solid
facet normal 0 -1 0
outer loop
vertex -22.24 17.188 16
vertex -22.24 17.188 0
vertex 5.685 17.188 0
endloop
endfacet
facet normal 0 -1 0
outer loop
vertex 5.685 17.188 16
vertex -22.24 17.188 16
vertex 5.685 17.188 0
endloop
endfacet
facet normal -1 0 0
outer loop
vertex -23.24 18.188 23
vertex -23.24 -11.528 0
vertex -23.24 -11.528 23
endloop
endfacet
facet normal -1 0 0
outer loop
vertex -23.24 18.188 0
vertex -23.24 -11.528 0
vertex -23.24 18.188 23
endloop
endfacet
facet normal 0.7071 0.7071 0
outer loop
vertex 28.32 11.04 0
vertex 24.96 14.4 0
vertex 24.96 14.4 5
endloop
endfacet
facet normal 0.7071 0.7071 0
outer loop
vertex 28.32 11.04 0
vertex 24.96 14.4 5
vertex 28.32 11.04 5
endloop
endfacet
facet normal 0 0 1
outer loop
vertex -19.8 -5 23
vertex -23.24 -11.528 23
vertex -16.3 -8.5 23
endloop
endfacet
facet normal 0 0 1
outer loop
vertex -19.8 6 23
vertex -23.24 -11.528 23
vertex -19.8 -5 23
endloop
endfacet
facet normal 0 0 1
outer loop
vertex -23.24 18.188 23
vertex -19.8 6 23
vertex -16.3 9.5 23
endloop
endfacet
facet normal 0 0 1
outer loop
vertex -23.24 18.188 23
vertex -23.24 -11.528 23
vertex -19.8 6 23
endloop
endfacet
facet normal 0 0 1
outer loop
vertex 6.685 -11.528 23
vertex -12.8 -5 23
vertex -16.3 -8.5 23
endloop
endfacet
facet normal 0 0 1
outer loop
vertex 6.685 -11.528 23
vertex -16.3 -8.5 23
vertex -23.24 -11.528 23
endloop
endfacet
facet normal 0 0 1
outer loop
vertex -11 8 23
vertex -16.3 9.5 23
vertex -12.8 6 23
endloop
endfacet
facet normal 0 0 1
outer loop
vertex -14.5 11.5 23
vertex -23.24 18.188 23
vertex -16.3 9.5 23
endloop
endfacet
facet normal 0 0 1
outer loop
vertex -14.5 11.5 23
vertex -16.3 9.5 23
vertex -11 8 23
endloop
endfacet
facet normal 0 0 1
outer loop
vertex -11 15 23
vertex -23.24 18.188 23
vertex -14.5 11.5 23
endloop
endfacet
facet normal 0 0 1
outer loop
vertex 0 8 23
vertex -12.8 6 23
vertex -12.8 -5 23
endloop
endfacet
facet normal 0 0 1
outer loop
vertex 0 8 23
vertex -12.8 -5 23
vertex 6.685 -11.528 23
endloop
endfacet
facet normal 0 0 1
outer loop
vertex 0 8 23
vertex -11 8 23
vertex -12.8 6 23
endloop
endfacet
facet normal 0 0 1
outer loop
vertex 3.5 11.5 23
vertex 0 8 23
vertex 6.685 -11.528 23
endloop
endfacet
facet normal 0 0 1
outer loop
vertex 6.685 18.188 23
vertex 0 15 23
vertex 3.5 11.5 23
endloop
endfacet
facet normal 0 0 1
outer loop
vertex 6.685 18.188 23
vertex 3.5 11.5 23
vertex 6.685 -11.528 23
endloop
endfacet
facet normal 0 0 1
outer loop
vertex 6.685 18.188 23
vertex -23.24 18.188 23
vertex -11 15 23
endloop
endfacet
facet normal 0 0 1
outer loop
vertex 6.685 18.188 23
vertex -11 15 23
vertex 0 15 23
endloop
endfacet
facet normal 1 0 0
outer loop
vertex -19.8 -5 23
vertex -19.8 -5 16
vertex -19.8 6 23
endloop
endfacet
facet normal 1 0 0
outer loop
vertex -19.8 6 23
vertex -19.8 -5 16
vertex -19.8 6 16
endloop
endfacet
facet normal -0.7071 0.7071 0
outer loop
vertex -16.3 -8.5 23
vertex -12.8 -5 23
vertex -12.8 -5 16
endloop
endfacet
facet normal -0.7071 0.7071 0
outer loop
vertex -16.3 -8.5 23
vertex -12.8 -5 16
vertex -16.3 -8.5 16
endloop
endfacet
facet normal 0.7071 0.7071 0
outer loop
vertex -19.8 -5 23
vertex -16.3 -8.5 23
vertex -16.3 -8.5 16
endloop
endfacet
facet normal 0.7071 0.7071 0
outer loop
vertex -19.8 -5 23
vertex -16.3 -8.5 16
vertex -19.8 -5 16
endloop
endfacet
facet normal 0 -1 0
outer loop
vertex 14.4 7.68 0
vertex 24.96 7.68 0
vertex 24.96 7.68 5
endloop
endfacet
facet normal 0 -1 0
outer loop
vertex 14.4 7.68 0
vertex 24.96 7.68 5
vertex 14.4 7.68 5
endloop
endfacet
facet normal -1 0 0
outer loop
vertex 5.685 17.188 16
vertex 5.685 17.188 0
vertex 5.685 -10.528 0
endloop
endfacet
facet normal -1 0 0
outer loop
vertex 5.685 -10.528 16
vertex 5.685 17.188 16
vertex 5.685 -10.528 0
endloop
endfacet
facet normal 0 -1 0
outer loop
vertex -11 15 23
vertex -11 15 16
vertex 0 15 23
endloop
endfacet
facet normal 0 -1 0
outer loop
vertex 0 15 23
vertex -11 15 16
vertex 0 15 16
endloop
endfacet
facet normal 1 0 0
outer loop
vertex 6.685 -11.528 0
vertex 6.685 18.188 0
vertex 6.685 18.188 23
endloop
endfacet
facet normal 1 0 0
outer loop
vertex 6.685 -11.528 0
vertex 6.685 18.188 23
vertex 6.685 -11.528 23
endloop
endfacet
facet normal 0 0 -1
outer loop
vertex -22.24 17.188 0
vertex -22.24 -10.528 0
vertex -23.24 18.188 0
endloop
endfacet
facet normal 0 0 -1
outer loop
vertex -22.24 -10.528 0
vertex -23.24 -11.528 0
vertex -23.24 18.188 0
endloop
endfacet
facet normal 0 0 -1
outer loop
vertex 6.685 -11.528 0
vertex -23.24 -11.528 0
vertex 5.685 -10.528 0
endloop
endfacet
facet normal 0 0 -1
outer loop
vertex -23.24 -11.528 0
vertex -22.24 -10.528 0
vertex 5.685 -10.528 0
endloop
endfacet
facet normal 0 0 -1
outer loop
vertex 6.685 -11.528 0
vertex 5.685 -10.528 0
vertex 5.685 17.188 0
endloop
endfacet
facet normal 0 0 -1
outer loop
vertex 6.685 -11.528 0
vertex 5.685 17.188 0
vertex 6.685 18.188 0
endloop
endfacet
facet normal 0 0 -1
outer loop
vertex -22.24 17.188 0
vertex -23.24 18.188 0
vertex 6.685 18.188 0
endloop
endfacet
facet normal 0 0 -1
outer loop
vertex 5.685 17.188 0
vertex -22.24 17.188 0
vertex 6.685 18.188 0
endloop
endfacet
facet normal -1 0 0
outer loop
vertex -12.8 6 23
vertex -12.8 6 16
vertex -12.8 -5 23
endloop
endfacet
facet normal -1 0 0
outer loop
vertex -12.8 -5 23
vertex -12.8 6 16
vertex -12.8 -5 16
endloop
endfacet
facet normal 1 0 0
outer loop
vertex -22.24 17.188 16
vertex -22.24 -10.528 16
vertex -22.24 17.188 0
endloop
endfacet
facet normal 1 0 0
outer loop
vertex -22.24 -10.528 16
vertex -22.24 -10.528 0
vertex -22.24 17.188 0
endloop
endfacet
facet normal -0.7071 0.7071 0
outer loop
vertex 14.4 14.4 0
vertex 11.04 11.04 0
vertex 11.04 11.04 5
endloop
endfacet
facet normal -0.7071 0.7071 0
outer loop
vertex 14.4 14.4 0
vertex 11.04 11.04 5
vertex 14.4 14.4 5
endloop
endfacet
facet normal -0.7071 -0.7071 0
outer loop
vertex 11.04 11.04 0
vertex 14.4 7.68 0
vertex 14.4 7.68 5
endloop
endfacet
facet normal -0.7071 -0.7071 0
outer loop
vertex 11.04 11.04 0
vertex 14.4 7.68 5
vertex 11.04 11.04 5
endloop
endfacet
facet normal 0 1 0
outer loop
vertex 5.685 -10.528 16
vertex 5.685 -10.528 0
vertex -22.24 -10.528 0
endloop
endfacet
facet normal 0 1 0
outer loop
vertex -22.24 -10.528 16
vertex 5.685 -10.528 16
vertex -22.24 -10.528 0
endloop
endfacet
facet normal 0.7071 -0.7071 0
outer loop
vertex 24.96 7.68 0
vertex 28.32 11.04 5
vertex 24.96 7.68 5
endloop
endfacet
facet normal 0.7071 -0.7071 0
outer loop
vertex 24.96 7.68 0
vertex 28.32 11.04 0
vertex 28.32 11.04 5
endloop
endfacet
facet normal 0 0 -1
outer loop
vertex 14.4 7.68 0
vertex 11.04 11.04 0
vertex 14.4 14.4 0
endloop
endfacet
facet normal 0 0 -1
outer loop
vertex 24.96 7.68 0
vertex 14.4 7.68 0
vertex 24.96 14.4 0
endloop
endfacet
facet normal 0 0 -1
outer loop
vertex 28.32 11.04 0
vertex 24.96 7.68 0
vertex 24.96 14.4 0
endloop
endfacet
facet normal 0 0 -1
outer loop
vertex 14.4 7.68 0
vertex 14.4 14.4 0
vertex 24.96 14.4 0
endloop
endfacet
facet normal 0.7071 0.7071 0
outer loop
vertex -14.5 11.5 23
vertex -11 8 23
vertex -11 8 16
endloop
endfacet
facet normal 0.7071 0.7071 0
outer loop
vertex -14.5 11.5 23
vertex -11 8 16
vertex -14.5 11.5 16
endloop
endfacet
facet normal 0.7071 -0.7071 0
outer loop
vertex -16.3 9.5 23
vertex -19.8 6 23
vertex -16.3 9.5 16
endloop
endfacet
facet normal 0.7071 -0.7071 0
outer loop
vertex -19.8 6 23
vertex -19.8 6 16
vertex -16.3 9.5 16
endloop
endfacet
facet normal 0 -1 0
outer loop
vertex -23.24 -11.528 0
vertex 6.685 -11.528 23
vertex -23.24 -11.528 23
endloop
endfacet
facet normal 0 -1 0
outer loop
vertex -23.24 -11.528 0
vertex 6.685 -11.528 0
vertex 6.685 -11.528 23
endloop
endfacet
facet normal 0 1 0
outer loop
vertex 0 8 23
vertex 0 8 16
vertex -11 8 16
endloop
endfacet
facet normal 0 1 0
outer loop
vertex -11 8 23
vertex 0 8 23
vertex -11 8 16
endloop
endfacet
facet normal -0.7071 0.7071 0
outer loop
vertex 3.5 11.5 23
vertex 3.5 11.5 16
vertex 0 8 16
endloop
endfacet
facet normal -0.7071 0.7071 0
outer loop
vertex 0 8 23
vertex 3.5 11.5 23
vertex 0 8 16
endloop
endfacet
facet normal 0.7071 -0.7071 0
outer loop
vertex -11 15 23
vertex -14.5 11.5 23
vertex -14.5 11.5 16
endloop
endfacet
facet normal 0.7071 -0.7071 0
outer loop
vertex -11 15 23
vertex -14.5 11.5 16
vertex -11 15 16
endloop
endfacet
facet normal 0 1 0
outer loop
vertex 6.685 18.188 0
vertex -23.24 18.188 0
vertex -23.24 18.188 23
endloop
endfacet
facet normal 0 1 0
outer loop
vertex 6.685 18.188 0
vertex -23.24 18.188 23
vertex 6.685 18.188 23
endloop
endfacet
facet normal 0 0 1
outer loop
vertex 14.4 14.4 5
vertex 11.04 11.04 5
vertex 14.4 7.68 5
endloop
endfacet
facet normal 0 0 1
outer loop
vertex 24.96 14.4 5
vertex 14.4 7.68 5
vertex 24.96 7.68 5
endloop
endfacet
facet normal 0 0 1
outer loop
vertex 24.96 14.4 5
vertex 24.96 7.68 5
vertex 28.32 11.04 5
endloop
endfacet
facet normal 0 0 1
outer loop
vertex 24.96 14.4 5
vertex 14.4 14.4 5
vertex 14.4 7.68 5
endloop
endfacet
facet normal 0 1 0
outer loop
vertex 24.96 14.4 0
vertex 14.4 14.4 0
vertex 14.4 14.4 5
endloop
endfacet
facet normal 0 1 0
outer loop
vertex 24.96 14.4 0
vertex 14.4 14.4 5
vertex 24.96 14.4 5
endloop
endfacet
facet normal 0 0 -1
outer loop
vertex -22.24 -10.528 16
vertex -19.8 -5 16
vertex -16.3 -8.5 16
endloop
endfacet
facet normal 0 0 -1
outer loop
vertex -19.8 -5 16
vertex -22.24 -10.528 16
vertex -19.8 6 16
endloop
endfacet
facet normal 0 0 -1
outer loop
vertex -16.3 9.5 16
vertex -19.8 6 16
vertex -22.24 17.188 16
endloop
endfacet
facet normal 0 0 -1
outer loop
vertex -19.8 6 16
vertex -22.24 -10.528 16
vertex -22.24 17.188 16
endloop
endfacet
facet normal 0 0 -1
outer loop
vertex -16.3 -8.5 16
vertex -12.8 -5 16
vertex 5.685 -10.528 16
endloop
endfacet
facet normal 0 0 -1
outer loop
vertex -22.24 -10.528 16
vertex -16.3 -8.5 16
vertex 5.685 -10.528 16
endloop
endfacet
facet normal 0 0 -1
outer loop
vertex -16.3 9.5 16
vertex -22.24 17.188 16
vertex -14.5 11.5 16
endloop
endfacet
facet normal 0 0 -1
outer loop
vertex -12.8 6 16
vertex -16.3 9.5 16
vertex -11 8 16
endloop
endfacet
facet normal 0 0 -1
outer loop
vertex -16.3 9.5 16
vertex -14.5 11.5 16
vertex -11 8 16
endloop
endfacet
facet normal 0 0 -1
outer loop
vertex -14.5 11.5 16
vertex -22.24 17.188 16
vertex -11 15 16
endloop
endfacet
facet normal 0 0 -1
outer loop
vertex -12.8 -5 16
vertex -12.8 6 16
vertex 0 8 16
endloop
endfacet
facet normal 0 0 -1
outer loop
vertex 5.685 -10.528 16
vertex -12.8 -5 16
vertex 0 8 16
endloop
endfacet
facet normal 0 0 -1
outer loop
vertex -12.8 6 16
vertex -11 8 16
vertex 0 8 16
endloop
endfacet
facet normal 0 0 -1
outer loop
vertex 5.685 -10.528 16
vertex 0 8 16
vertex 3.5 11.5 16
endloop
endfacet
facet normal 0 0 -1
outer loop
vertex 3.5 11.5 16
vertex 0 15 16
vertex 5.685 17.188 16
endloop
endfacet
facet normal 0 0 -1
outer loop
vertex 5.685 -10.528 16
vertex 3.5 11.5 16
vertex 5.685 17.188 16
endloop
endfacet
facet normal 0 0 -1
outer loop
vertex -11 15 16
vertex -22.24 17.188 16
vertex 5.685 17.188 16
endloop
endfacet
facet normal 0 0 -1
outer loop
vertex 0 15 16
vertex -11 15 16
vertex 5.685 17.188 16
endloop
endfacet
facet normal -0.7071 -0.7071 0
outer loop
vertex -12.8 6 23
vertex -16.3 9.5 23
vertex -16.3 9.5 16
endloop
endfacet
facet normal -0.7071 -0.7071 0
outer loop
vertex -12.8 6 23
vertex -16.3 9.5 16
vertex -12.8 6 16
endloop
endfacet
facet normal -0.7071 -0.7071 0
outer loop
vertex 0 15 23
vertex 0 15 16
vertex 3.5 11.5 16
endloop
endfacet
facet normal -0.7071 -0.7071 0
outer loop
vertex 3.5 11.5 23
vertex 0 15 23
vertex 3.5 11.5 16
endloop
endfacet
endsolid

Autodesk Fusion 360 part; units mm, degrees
sketch "Sketch1" plane through (0, 0, 0) normal (0, 0, 1) x (1, 0, 0)
  line L0 (-16.3137, 11.5) -> (-5, 11.5)
  line L1 (-5, 11.5) -> (-16.3137, 0.1863)
  line L2 (-16.3137, 0.1863) -> (-16.3137, 11.5)
  line L3 (-14.5, 11.5) -> (-11, 15)
  line L4 (-11, 15) -> (0, 15)
  line L5 (0, 15) -> (3.5, 11.5)
  line L6 (3.5, 11.5) -> (0, 8)
  line L7 (0, 8) -> (-11, 8)
  line L8 (-11, 8) -> (-14.5, 11.5)
  line L9 (-19.8, 6) -> (-16.3, 9.5)
  line L10 (-12.8, -5) -> (-16.3, -8.5)
  line L11 (-16.3, 9.5) -> (-12.8, 6)
  line L12 (-19.8, -5) -> (-19.8, 6)
  line L13 (-16.3, -8.5) -> (-19.8, -5)
  line L14 (-12.8, 6) -> (-12.8, -5)
  line L15 (-23.2399, 18.1875) -> (6.6848, 18.1875)
  line L16 (6.6848, 18.1875) -> (6.6848, -11.5279)
  line L17 (6.6848, -11.5279) -> (-23.2399, -11.5279)
  line L18 (-23.2399, -11.5279) -> (-23.2399, 18.1875)
  line L19 (-22.2399, 17.1875) -> (5.6848, 17.1875)
  line L20 (5.6848, 17.1875) -> (5.6848, -10.5279)
  line L21 (5.6848, -10.5279) -> (-22.2399, -10.5279)
  line L22 (-22.2399, -10.5279) -> (-22.2399, 17.1875)
  line L23 (11.04, 11.04) -> (14.4, 14.4)
  line L24 (14.4, 7.68) -> (11.04, 11.04)
  line L25 (24.96, 7.68) -> (14.4, 7.68)
  line L26 (28.32, 11.04) -> (24.96, 7.68)
  line L27 (24.96, 14.4) -> (28.32, 11.04)
  line L28 (14.4, 14.4) -> (24.96, 14.4)
  point P0 (-7, -4.5)
  dimension "d3" = 11.3137
  dimension "d11" = 7
  dimension "d14" = 18
  dimension "d21" = 1
  dimension "d22" = 1
  dimension "d23" = 1
  dimension "d24" = 1
extrude "Extrude2" add sketch "Sketch1" along normal blind 23 contours L0 L1 L2 L7 L8 L9 L11 L14 | L15 L16 L17 L18 | L19 L20 L21 L22 makes body 1
extrude "Extrude3" cut sketch "Sketch1" along normal blind 16 contours L0 L1 L2 L7 L8 L9 L11 L14 | L0 L1 L3 L4 L5 L6 L7 | L0 L1 L7 L8 | L1 L2 L9 L11 L14 | L1 L2 L9 L10 L12 L13 L14 | L19 L20 L21 L22 bodies 1
extrude "Extrude4" add sketch "Sketch1" along normal blind 5 separate body contours L23 L24 L25 L26 L27 L28 makes body 2
equation "vspace = 11.313708499 mm"
equation "d11 = thickboy"
equation "thickboy = 7 mm"
equation "with = 18 mm"
equation "d14 = with"
equation "tol = 0.127 mm"
